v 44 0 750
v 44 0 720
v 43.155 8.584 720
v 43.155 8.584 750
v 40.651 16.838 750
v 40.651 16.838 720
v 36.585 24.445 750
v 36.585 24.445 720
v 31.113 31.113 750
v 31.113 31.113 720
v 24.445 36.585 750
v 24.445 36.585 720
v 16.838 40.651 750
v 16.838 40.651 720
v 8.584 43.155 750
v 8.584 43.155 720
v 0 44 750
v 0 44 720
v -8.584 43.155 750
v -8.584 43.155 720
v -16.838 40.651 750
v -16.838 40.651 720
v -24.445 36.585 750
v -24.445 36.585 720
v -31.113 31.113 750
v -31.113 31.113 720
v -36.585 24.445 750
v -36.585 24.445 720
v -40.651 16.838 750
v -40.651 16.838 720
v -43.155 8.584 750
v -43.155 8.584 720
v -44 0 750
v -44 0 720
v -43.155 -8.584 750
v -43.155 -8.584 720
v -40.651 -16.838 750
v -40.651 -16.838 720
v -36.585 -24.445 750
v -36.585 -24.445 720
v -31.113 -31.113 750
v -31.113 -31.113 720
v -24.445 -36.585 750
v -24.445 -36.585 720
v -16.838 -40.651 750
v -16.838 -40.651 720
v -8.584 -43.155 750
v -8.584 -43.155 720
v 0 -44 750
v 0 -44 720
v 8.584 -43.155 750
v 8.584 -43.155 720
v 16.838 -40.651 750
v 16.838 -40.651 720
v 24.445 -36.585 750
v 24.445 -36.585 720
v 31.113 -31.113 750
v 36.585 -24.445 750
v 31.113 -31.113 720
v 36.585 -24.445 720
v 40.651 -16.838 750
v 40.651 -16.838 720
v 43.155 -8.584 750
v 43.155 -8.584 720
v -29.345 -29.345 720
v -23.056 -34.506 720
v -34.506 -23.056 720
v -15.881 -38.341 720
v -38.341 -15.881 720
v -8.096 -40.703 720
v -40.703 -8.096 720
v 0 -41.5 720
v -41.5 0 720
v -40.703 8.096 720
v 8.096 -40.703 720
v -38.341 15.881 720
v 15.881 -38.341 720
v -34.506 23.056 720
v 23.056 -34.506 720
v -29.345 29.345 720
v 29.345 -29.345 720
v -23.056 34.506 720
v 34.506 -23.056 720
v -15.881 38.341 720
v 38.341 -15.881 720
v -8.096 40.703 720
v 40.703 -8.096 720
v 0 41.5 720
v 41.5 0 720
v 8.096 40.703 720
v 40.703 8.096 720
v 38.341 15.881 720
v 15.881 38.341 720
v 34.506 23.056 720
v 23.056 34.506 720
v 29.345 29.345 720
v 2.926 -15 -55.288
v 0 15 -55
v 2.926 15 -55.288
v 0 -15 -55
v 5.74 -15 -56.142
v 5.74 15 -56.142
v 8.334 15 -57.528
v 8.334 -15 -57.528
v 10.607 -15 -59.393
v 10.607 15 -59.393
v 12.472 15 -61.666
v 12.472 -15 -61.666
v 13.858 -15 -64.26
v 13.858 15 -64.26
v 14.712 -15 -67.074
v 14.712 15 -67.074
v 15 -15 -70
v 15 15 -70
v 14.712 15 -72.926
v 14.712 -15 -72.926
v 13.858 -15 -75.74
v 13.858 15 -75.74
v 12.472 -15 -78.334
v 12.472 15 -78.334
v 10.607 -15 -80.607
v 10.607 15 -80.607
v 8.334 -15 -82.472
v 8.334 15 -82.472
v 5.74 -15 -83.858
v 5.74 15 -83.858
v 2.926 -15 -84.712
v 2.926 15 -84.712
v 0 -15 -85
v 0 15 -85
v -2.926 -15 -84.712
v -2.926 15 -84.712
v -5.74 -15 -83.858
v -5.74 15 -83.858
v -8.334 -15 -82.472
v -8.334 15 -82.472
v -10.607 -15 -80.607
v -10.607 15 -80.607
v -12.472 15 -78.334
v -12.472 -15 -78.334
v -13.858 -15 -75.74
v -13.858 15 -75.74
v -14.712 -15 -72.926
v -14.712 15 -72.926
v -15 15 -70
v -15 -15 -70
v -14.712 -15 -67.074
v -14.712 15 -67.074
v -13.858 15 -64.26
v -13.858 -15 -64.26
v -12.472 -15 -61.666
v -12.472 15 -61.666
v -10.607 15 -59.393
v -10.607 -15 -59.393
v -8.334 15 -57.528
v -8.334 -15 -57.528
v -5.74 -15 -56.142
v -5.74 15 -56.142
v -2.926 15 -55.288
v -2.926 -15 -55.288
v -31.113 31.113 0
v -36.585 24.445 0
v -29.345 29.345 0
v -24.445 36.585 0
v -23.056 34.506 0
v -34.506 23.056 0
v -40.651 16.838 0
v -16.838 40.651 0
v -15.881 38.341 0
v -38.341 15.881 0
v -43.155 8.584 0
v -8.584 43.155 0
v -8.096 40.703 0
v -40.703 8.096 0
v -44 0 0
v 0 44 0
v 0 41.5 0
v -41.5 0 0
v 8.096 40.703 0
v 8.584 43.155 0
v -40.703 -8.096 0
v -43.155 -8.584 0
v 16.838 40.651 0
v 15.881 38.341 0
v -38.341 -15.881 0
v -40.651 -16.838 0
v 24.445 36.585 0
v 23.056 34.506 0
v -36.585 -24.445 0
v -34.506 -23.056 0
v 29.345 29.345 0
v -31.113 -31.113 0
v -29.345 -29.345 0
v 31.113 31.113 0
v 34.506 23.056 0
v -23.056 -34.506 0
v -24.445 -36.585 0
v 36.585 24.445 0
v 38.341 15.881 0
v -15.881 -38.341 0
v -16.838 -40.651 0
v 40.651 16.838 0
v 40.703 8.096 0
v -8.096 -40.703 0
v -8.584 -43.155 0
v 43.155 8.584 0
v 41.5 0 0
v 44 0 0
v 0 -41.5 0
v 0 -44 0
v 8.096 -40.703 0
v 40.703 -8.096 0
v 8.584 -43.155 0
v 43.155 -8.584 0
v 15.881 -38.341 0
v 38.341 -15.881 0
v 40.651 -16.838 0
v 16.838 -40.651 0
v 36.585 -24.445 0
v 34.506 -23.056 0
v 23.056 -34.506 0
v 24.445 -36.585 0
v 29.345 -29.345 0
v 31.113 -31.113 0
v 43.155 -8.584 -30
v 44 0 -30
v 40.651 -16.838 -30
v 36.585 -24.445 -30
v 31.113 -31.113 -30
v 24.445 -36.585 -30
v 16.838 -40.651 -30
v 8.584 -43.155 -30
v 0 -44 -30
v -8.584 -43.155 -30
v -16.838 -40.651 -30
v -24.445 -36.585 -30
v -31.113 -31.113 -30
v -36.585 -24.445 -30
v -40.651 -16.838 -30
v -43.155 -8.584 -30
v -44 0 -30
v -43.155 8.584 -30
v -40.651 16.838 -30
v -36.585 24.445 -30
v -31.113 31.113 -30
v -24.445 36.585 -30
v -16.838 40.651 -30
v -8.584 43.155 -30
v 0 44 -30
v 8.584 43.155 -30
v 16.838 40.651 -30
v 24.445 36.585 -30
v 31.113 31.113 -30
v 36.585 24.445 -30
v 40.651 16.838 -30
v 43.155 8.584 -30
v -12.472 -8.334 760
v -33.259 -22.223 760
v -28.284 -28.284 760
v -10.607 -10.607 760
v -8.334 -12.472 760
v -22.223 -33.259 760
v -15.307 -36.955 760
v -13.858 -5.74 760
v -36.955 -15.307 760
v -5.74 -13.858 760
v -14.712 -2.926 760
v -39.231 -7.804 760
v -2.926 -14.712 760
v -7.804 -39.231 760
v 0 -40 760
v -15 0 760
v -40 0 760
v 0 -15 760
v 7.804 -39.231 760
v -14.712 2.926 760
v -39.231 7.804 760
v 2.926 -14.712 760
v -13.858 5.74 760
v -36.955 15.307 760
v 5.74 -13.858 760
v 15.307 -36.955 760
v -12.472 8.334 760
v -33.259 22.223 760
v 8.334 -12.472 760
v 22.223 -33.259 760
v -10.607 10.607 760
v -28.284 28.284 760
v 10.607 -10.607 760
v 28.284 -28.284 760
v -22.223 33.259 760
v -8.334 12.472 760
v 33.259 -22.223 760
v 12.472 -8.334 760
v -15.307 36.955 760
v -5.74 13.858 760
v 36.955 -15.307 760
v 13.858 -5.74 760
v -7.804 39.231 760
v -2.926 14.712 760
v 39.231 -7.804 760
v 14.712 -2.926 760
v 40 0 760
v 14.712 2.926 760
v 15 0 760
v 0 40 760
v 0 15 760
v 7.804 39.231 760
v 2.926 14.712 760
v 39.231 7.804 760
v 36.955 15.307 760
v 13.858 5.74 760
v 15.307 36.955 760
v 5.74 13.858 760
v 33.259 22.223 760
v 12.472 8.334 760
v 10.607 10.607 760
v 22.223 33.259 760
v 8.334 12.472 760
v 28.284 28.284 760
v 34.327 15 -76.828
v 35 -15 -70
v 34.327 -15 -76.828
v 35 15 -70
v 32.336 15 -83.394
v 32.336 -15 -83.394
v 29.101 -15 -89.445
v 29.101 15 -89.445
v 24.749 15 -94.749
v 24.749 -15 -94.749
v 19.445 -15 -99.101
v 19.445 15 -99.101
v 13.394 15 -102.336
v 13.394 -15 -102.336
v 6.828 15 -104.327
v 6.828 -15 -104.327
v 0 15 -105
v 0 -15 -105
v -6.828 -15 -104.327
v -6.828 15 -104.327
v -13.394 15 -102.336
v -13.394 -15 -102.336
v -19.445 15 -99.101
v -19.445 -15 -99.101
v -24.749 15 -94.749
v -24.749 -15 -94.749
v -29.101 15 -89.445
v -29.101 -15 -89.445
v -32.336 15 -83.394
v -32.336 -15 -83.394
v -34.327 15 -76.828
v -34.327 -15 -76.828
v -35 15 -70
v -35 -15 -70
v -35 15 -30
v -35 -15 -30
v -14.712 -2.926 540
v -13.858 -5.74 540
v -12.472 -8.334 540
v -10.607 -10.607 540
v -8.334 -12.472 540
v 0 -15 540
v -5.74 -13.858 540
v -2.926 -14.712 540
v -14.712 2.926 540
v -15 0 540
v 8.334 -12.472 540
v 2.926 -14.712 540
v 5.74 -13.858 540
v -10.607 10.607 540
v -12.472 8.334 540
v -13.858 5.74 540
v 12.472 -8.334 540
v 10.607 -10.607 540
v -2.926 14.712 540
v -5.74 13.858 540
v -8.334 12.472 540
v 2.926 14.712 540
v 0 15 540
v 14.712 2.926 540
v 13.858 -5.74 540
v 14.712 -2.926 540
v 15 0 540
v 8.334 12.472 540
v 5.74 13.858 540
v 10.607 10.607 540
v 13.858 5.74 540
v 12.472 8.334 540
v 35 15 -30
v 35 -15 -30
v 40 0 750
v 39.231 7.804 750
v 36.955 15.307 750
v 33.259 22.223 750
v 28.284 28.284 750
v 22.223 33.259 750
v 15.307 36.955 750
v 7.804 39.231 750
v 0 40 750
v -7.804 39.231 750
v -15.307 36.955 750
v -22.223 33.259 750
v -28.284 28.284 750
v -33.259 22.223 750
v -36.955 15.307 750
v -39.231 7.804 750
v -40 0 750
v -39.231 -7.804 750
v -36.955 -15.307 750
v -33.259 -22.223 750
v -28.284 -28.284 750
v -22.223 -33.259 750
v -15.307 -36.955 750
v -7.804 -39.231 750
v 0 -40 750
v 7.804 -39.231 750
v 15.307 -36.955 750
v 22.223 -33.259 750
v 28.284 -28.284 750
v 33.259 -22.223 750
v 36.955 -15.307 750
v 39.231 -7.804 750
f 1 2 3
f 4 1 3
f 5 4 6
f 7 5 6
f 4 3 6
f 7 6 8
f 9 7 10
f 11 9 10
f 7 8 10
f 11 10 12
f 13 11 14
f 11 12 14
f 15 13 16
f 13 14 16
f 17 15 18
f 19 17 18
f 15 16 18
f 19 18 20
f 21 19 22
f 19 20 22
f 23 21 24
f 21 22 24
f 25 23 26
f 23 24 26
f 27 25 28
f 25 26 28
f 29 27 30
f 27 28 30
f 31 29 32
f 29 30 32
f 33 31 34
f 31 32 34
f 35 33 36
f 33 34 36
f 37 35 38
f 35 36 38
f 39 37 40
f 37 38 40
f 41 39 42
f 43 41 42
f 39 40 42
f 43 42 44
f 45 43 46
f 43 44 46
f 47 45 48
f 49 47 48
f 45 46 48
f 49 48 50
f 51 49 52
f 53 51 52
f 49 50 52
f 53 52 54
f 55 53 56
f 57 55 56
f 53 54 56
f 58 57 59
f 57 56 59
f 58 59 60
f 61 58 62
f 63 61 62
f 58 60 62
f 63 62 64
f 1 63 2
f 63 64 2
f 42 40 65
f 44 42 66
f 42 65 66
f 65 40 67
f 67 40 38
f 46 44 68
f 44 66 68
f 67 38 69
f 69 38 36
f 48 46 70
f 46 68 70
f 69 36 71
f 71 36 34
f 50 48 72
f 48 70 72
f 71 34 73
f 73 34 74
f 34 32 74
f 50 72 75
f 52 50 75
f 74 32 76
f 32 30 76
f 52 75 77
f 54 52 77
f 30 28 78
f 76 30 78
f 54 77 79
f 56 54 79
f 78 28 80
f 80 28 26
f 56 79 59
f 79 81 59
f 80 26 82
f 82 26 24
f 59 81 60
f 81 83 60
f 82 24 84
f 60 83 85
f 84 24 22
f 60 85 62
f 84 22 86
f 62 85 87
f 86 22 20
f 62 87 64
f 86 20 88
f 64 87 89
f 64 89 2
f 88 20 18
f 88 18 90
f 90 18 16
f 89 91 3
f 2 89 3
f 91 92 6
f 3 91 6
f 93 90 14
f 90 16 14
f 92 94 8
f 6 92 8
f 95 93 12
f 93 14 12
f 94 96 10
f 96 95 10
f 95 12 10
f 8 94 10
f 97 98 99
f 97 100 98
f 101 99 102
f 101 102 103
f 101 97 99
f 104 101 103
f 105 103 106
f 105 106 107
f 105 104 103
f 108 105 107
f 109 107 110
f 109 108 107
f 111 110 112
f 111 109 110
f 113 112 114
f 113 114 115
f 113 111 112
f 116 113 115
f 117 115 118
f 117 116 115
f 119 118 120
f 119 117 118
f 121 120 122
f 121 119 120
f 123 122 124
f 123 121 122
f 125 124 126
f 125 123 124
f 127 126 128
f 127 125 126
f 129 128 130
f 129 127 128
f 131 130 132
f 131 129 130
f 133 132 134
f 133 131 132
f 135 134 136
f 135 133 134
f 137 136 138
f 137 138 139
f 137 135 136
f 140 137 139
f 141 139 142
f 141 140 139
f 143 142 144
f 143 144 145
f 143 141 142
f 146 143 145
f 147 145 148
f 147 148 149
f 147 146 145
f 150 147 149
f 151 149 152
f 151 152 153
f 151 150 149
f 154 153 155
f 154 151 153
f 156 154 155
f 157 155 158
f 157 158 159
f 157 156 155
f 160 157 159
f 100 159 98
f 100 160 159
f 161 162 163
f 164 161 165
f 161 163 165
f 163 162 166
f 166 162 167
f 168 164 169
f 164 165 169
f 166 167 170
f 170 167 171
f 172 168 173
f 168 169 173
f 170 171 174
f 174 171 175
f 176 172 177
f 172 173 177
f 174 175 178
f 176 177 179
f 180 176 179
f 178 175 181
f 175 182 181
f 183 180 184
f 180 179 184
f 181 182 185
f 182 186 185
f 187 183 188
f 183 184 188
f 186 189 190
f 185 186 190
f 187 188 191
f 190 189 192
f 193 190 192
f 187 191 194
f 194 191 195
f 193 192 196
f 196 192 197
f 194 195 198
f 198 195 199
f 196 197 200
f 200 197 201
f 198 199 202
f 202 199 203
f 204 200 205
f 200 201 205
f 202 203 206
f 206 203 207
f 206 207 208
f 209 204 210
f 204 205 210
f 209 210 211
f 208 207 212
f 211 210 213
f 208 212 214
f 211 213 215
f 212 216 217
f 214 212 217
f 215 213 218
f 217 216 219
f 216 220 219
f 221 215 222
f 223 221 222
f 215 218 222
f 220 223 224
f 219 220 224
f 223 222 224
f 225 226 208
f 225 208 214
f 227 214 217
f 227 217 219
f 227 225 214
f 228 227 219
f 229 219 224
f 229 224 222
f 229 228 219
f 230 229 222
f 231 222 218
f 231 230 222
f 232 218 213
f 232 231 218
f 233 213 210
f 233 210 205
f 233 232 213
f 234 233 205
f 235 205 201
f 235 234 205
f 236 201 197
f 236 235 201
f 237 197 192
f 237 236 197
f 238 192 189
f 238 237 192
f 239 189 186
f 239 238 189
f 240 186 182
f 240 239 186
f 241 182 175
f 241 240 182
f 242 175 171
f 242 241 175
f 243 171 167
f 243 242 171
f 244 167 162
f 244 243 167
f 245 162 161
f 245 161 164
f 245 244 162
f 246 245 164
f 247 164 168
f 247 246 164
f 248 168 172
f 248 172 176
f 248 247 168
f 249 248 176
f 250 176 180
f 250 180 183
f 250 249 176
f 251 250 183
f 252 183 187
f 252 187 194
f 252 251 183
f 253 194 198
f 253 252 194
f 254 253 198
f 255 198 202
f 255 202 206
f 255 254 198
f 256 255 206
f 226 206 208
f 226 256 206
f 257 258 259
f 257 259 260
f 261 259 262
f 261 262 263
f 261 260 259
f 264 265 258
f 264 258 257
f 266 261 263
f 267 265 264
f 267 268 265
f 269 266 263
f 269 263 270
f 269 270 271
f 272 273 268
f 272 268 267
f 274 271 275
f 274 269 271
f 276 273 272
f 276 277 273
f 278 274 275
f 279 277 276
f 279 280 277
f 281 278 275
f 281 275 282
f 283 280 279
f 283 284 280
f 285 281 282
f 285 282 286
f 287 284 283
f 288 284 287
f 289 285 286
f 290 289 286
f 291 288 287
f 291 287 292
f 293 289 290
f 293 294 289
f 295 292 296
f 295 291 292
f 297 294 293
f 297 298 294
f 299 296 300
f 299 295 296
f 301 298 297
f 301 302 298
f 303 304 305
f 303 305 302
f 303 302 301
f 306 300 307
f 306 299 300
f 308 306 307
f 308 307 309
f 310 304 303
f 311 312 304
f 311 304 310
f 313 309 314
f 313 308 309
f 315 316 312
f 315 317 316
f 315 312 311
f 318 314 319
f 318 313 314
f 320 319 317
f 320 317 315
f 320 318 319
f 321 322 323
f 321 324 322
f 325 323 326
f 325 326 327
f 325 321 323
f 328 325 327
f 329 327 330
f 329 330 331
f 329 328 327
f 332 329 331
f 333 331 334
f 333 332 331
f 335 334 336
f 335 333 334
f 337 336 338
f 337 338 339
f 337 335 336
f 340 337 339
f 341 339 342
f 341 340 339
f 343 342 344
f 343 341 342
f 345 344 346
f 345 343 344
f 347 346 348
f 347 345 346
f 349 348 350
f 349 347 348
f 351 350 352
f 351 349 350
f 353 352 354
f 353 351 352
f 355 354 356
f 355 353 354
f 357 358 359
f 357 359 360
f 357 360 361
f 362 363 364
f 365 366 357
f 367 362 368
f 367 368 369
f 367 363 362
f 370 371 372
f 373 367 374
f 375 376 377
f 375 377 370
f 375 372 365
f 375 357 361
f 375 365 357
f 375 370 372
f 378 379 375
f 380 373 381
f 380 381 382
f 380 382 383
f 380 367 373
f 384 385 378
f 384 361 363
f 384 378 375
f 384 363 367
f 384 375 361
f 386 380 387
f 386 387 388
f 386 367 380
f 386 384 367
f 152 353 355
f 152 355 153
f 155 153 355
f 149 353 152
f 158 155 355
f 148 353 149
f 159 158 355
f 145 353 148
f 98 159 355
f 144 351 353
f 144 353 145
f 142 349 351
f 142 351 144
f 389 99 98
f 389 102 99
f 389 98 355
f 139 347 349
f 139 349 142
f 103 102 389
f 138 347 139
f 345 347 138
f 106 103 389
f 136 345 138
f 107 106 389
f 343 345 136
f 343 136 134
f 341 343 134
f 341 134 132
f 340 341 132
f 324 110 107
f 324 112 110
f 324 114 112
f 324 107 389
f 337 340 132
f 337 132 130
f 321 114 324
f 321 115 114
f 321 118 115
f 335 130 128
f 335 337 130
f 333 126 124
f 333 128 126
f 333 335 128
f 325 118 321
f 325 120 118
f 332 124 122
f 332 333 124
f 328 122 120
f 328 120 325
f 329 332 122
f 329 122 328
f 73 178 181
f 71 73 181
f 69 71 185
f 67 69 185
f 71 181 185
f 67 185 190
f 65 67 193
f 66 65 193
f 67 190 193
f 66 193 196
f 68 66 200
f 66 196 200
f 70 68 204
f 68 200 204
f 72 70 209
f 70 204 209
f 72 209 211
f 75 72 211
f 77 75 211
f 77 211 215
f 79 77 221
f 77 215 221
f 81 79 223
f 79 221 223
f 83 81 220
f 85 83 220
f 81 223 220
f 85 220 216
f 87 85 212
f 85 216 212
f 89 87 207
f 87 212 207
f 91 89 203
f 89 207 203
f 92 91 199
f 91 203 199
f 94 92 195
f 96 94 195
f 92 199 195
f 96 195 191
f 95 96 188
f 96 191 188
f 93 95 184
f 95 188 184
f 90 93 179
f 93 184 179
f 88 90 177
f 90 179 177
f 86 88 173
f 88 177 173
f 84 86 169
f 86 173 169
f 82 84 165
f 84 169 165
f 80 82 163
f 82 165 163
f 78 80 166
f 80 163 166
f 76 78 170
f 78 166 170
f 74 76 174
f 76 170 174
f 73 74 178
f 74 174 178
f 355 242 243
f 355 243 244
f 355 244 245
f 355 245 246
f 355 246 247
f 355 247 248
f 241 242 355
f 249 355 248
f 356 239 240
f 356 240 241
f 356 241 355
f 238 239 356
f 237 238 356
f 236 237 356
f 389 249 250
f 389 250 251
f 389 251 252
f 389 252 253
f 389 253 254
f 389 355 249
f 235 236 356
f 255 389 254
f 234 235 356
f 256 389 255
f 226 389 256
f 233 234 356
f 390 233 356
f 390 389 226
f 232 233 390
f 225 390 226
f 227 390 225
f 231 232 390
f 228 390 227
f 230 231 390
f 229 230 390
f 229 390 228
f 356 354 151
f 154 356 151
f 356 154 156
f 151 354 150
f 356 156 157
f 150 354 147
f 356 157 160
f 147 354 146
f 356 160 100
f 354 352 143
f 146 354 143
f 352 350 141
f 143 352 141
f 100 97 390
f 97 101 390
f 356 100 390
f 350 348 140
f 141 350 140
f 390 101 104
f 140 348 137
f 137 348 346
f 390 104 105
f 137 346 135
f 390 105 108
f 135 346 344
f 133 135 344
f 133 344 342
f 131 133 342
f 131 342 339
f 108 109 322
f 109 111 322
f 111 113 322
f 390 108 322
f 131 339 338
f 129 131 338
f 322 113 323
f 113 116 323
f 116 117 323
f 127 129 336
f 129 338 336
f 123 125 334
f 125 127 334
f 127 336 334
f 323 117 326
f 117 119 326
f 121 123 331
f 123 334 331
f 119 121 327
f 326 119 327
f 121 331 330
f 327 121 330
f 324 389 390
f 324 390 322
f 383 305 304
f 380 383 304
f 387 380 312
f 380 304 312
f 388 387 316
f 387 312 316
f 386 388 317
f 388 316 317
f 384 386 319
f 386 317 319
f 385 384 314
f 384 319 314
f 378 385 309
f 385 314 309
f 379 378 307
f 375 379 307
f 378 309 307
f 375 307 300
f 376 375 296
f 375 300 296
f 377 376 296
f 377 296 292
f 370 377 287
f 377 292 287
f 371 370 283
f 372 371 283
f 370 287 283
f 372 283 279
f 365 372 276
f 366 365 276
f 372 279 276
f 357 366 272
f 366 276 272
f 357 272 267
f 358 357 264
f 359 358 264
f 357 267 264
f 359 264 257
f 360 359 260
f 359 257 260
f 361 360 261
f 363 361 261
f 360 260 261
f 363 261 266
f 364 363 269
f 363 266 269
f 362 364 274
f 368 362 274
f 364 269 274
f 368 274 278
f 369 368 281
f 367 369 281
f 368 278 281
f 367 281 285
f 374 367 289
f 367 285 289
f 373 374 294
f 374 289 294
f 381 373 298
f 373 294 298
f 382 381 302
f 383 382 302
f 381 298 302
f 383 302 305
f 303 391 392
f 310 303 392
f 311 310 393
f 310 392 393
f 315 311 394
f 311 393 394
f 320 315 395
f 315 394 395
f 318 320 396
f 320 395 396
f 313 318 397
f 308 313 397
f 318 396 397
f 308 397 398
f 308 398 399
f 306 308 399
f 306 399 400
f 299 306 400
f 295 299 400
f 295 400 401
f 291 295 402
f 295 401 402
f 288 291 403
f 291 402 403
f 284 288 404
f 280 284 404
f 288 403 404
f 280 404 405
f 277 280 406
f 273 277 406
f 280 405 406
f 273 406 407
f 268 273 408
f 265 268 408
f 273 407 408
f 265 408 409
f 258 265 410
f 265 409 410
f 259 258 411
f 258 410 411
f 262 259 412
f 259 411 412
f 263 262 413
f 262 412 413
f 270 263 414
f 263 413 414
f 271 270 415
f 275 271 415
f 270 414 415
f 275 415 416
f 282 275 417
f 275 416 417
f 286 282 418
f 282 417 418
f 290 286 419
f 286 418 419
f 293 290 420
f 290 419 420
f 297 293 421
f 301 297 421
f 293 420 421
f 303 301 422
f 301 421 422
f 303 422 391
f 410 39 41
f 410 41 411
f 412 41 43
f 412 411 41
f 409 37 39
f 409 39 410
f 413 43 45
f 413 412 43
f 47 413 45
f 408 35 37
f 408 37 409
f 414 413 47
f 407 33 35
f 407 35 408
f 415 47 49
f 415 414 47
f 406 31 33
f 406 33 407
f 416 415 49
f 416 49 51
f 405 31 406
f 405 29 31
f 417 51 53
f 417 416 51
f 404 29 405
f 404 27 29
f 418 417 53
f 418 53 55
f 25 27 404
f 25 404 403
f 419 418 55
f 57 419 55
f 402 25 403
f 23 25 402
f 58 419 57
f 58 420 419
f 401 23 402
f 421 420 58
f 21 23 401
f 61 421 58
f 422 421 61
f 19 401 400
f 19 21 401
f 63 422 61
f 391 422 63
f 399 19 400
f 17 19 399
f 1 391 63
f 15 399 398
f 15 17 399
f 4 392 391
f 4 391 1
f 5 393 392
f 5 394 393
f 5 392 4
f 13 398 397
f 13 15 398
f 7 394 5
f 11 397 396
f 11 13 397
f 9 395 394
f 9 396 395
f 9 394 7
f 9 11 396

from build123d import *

# Parameters (mm, degrees)
SKETCH_1_R          = 41.5
EXTRUDE_1_DEPTH     = 720
SKETCH_2_R          = 44
EXTRUDE_2_DEPTH     = 30
EXTRUDE_START       = 30
SKETCH_3_R          = 44
EXTRUDE_3_DEPTH     = 30
SKETCH_4_R          = 40
EXTRUDE_4_DEPTH     = 10
SKETCH_6_R          = 15
EXTRUDE_6_DEPTH     = 15
SKETCH_5_R          = 15
CUT_EXTRUDE_1_DEPTH = 220


with BuildPart() as part:
    # 草图1 → 拉伸1 (new body)
    with BuildSketch(Plane.XY):
        with Locations(Location((0, 0, 0), (0, 0, 180))):
            Circle(SKETCH_1_R)
    extrude(amount=EXTRUDE_1_DEPTH)

    # 草图2 → 拉伸2 (add)
    with BuildSketch(Plane.XY.offset(720)):
        Circle(SKETCH_2_R)
    extrude(amount=EXTRUDE_2_DEPTH)

    # 草图3 → 拉伸3 (add)
    with BuildSketch(Plane(origin=(0, 0, 0), x_dir=(-1, 0, 0), z_dir=(0, 0, -1)).offset(EXTRUDE_START)):
        with Locations(Location((0, 0, 0), (0, 0, 180))):
            Circle(SKETCH_3_R)
    extrude(amount=-EXTRUDE_3_DEPTH)

    # 草图4 → 拉伸4 (add)
    with BuildSketch(Plane.XY.offset(750)):
        Circle(SKETCH_4_R)
    extrude(amount=EXTRUDE_4_DEPTH)

    # 草图6 → 拉伸6 (add, symmetric)
    with BuildSketch(Plane(origin=(0, 0, 0), x_dir=(1, 0, 0), z_dir=(0, 1, 0))):
        with BuildLine():
            Line((-35, 70), (-35, 30))
            Line((-35, 30), (35, 30))
            Line((35, 30), (35, 70))
            ThreePointArc((35, 70), (0, 105), (-35, 70))
        make_face()
        with Locations(Location((0, 70, 0), (0, 0, 270))):
            Circle(SKETCH_6_R, mode=Mode.SUBTRACT)
    extrude(amount=EXTRUDE_6_DEPTH, both=True)

    # 草图5 → 切除-拉伸1 (cut)
    with BuildSketch(Plane.XY.offset(760)):
        Circle(SKETCH_5_R)
    extrude(amount=-CUT_EXTRUDE_1_DEPTH, mode=Mode.SUBTRACT)


solid = part.part
